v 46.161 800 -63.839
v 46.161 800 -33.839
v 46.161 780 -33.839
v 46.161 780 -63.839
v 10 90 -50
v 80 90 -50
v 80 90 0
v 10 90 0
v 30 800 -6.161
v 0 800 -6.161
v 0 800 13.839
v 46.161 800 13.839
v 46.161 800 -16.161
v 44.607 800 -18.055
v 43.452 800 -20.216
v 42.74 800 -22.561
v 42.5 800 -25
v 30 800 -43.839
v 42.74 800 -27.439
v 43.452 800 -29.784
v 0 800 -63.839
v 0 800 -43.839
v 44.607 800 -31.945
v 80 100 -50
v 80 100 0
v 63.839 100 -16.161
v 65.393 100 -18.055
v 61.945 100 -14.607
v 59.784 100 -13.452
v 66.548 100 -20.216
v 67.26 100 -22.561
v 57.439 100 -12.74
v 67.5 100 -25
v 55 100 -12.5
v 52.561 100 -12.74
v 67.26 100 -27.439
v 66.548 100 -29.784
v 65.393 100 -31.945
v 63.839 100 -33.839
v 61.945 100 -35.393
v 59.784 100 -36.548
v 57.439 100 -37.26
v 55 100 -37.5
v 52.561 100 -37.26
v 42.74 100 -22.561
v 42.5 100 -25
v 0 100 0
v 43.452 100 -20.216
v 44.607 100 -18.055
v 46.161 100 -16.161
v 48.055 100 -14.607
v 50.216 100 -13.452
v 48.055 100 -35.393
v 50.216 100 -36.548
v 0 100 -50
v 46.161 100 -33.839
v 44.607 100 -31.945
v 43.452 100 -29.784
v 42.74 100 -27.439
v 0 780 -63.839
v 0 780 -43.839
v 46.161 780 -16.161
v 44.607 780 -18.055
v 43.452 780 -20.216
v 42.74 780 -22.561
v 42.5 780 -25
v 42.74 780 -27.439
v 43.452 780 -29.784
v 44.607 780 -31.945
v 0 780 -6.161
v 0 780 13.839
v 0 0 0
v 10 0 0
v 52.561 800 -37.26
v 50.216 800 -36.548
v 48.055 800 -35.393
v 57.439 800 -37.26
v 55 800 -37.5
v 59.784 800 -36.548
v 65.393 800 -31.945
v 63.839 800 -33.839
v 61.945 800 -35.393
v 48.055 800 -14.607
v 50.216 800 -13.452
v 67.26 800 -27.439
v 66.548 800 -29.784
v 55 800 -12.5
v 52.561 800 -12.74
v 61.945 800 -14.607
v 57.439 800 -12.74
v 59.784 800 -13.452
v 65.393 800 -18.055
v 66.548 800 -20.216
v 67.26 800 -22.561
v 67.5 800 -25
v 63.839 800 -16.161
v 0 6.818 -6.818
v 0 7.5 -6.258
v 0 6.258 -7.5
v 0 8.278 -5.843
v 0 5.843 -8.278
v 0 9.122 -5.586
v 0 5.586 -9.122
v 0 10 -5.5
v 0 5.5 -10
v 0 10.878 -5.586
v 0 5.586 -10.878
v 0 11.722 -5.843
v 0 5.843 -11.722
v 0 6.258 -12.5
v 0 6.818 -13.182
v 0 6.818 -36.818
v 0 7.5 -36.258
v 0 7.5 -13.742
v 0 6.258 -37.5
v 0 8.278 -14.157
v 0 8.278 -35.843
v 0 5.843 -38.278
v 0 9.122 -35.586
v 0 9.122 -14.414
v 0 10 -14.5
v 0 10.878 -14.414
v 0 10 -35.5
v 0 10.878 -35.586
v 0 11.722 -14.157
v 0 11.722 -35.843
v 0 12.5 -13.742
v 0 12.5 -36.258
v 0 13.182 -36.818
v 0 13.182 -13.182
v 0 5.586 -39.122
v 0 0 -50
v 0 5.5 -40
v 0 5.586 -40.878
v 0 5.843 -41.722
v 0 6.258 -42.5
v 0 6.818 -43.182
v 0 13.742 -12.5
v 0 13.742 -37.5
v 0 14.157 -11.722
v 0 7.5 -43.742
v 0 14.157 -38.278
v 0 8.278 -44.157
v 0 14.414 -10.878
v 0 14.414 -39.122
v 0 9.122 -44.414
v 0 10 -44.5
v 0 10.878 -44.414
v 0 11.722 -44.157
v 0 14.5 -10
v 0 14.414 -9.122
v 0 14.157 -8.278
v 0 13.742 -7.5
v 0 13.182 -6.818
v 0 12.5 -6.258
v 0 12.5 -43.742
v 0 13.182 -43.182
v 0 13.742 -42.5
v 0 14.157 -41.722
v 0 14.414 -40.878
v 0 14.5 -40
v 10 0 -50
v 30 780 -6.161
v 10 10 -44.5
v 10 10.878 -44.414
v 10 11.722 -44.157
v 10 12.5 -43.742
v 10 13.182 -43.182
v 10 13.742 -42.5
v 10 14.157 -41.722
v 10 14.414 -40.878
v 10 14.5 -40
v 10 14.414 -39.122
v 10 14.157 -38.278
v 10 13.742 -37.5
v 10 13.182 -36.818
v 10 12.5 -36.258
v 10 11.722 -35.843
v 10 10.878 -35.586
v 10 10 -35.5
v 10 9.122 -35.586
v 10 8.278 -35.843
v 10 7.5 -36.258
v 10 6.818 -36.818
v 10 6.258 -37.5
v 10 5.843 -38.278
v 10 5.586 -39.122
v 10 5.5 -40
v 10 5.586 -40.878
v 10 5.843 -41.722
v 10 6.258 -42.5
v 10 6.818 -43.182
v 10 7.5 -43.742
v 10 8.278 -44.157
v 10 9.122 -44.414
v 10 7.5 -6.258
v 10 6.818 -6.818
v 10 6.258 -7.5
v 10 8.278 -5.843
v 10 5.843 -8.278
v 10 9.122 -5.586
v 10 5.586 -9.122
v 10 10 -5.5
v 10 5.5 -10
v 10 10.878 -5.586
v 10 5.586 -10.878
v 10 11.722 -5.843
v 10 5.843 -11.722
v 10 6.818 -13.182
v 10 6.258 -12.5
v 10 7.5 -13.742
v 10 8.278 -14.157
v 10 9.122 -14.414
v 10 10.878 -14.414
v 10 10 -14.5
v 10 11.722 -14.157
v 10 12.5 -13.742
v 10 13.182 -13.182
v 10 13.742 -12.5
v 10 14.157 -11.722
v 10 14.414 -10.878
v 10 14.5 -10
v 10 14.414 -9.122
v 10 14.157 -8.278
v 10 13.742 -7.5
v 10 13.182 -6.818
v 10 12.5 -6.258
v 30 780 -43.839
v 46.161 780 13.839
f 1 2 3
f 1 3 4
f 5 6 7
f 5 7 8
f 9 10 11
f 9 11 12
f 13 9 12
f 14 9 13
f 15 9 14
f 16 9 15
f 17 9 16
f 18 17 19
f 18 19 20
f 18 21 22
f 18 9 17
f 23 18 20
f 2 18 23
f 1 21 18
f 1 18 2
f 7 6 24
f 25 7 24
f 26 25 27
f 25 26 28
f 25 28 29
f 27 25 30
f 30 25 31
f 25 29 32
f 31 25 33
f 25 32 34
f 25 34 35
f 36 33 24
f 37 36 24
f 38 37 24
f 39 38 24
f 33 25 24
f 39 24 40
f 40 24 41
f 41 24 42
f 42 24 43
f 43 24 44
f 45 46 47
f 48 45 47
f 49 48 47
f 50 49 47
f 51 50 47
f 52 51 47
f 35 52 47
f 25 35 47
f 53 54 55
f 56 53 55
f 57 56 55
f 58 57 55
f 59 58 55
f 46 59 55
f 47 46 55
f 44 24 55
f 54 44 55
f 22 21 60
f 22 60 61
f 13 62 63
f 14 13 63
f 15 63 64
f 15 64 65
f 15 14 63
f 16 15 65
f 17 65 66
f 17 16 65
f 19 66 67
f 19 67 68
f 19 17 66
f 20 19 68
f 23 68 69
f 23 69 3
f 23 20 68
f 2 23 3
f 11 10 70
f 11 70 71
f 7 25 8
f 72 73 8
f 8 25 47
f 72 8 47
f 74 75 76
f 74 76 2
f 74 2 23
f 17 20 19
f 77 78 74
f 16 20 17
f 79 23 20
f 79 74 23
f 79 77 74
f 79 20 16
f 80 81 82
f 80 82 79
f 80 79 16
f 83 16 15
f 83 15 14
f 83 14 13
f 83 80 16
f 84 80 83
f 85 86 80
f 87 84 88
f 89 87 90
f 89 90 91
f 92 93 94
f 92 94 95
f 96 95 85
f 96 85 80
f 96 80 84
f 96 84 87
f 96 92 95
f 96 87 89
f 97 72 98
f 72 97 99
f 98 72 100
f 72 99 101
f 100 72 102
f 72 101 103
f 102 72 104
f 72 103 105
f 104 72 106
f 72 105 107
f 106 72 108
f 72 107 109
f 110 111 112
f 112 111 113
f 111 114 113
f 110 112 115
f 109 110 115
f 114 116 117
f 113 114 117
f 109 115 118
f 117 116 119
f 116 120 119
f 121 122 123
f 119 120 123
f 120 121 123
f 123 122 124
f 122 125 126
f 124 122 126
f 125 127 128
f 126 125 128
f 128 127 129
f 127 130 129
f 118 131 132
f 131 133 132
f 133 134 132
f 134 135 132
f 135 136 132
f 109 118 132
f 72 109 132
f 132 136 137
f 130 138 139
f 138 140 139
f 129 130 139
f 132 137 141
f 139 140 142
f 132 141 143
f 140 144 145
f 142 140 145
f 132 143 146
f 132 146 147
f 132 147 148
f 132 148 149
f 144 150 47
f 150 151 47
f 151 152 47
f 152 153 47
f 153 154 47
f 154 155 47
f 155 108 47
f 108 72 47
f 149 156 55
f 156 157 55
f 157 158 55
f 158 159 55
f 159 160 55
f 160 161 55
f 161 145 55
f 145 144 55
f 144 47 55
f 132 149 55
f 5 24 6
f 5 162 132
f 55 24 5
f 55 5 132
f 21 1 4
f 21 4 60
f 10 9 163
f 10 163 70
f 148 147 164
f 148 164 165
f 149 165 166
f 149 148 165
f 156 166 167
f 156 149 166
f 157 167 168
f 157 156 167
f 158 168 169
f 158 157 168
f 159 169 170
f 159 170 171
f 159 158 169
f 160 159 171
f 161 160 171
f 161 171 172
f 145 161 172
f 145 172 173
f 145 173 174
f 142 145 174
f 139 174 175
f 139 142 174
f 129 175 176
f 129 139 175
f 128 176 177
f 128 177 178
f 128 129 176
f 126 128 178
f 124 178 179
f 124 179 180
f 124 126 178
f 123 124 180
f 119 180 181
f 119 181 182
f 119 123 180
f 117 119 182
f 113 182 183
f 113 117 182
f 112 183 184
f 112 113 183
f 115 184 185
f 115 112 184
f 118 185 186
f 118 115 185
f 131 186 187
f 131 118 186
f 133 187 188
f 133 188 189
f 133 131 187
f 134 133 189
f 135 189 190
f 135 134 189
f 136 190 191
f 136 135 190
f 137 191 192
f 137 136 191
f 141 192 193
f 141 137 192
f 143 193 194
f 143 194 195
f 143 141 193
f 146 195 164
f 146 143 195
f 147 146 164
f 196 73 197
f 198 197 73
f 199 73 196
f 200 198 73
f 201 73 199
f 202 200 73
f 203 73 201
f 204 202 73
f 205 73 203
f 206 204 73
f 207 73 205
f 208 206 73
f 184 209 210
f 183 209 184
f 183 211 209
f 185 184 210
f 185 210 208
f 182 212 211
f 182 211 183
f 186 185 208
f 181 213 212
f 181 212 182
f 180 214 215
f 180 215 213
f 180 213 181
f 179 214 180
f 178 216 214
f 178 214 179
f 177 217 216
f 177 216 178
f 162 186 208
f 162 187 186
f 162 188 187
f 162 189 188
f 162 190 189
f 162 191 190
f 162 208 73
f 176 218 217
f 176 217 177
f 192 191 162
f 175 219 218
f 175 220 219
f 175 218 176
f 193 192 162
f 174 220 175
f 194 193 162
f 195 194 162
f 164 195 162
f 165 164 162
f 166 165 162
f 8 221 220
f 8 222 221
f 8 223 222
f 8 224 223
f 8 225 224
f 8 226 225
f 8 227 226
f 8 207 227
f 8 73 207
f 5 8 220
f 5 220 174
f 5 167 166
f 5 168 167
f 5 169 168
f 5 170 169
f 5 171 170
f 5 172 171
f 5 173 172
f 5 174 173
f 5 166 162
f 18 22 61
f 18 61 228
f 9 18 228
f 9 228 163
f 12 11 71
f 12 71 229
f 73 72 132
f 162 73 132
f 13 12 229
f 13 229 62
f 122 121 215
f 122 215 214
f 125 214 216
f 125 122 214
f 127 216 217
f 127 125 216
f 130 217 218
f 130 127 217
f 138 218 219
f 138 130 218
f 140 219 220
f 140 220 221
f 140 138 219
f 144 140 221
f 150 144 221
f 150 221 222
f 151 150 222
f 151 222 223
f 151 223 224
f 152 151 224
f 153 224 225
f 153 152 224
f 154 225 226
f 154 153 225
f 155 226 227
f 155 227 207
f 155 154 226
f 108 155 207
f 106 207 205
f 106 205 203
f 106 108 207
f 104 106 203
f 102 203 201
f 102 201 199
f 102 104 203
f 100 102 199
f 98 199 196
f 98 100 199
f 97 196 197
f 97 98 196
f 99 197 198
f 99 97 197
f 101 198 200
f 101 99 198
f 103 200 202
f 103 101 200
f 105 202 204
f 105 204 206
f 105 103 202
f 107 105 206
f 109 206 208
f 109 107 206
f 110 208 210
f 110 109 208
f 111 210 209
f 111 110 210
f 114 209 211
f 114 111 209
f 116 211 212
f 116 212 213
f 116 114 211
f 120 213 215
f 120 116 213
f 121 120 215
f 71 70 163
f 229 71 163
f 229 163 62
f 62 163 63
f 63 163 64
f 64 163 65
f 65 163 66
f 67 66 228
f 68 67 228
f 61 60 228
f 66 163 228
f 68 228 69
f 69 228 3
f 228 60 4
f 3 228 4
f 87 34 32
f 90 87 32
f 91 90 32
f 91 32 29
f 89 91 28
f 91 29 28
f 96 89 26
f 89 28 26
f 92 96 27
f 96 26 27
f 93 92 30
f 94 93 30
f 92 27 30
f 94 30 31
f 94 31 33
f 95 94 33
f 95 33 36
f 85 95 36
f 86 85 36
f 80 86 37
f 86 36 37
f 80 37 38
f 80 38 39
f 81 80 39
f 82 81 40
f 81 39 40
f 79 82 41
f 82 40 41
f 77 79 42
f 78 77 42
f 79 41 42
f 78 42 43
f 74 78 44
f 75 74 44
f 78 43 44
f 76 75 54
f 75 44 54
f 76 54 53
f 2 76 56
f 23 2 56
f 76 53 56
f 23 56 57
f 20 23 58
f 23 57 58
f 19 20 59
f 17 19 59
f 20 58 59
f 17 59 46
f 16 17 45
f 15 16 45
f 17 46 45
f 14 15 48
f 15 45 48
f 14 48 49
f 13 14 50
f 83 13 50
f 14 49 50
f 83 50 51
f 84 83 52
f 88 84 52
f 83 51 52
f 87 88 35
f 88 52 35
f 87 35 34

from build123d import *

# Parameters (mm, degrees)
SZKIC1_W                    = 50
SZKIC1_H                    = 100
SZKIC1_R                    = 4.5
DODANIE_WYCI_GNI_CIE1_DEPTH = 10
SZKIC2_W                    = 80
SZKIC2_H                    = 10
DODANIE_WYCI_GNI_CIE2_DEPTH = 50
SZKIC3_R                    = 12.5
DODANIE_WYCI_GNI_CIE3_DEPTH = 700
DODANIE_WYCI_GNI_CIE4_DEPTH = 20


with BuildPart() as part:
    # Szkic1 → Dodanie-wyciągnięcie1 (new body)
    with BuildSketch(Plane(origin=(0, 0, 0), x_dir=(0, 0, -1), z_dir=(1, 0, 0))):
        with Locations((25, 50)):
            Rectangle(SZKIC1_W, SZKIC1_H)
        with Locations((10, 10)):
            Circle(SZKIC1_R, mode=Mode.SUBTRACT)
        with Locations((40, 10)):
            Circle(SZKIC1_R, mode=Mode.SUBTRACT)
    extrude(amount=DODANIE_WYCI_GNI_CIE1_DEPTH)

    # Szkic2 → Dodanie-wyciągnięcie2 (add)
    with BuildSketch(Plane(origin=(0, 0, -50), x_dir=(-1, 0, 0), z_dir=(0, 0, -1))):
        with Locations((-40, 95)):
            Rectangle(SZKIC2_W, SZKIC2_H)
    extrude(amount=-DODANIE_WYCI_GNI_CIE2_DEPTH)

    # Szkic3 → Dodanie-wyciągnięcie3 (add)
    with BuildSketch(Plane(origin=(0, 100, 0), x_dir=(1, 0, 0), z_dir=(0, 1, 0))):
        with Locations(Location((55, 25, 0), (0, 0, 270))):
            Circle(SZKIC3_R)
    extrude(amount=DODANIE_WYCI_GNI_CIE3_DEPTH)


with BuildPart() as body_2:
    # Szkic4 → Dodanie-wyciągnięcie4 (new body)
    with BuildSketch(Plane(origin=(0, 800, 0), x_dir=(1, 0, 0), z_dir=(0, 1, 0))):
        with BuildLine():
            Line((46.161165235, -13.838834765), (46.161165235, 16.161165235))
            ThreePointArc((46.161165235, 16.161165235), (42.5, 25), (46.161165235, 33.838834765))
            Line((46.161165235, 33.838834765), (46.161165235, 63.838834765))
            Line((46.161165235, 63.838834765), (0, 63.838834765))
            Line((0, 63.838834765), (0, 43.838834765))
            Line((0, 43.838834765), (30, 43.838834765))
            Line((30, 43.838834765), (30, 6.161165235))
            Line((30, 6.161165235), (0, 6.161165235))
            Line((0, 6.161165235), (0, -13.838834765))
            Line((0, -13.838834765), (46.161165235, -13.838834765))
        make_face()
    extrude(amount=-DODANIE_WYCI_GNI_CIE4_DEPTH)


solid = Compound([part.part, body_2.part])
